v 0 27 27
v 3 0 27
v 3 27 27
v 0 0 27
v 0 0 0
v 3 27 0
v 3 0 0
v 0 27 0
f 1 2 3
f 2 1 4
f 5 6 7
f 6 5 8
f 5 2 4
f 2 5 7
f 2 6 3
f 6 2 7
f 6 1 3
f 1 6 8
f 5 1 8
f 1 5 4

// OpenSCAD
// eMachina Print head carriage an rail
// ----------------------------------------------------------------
// It is licensed under the Creative Commons - GNU GPL license.
// © 2012 by Pascal "Carignan" Roy
// more info at : www.repmachina.ca
//Main Module Call
main();


module main()
{
	RodGearHolder();
	
	RailHolder();
}

module RodGearHolder()
{

br=22.08;
cube([3,27,27]);


}


module RailHolder()
{
}
